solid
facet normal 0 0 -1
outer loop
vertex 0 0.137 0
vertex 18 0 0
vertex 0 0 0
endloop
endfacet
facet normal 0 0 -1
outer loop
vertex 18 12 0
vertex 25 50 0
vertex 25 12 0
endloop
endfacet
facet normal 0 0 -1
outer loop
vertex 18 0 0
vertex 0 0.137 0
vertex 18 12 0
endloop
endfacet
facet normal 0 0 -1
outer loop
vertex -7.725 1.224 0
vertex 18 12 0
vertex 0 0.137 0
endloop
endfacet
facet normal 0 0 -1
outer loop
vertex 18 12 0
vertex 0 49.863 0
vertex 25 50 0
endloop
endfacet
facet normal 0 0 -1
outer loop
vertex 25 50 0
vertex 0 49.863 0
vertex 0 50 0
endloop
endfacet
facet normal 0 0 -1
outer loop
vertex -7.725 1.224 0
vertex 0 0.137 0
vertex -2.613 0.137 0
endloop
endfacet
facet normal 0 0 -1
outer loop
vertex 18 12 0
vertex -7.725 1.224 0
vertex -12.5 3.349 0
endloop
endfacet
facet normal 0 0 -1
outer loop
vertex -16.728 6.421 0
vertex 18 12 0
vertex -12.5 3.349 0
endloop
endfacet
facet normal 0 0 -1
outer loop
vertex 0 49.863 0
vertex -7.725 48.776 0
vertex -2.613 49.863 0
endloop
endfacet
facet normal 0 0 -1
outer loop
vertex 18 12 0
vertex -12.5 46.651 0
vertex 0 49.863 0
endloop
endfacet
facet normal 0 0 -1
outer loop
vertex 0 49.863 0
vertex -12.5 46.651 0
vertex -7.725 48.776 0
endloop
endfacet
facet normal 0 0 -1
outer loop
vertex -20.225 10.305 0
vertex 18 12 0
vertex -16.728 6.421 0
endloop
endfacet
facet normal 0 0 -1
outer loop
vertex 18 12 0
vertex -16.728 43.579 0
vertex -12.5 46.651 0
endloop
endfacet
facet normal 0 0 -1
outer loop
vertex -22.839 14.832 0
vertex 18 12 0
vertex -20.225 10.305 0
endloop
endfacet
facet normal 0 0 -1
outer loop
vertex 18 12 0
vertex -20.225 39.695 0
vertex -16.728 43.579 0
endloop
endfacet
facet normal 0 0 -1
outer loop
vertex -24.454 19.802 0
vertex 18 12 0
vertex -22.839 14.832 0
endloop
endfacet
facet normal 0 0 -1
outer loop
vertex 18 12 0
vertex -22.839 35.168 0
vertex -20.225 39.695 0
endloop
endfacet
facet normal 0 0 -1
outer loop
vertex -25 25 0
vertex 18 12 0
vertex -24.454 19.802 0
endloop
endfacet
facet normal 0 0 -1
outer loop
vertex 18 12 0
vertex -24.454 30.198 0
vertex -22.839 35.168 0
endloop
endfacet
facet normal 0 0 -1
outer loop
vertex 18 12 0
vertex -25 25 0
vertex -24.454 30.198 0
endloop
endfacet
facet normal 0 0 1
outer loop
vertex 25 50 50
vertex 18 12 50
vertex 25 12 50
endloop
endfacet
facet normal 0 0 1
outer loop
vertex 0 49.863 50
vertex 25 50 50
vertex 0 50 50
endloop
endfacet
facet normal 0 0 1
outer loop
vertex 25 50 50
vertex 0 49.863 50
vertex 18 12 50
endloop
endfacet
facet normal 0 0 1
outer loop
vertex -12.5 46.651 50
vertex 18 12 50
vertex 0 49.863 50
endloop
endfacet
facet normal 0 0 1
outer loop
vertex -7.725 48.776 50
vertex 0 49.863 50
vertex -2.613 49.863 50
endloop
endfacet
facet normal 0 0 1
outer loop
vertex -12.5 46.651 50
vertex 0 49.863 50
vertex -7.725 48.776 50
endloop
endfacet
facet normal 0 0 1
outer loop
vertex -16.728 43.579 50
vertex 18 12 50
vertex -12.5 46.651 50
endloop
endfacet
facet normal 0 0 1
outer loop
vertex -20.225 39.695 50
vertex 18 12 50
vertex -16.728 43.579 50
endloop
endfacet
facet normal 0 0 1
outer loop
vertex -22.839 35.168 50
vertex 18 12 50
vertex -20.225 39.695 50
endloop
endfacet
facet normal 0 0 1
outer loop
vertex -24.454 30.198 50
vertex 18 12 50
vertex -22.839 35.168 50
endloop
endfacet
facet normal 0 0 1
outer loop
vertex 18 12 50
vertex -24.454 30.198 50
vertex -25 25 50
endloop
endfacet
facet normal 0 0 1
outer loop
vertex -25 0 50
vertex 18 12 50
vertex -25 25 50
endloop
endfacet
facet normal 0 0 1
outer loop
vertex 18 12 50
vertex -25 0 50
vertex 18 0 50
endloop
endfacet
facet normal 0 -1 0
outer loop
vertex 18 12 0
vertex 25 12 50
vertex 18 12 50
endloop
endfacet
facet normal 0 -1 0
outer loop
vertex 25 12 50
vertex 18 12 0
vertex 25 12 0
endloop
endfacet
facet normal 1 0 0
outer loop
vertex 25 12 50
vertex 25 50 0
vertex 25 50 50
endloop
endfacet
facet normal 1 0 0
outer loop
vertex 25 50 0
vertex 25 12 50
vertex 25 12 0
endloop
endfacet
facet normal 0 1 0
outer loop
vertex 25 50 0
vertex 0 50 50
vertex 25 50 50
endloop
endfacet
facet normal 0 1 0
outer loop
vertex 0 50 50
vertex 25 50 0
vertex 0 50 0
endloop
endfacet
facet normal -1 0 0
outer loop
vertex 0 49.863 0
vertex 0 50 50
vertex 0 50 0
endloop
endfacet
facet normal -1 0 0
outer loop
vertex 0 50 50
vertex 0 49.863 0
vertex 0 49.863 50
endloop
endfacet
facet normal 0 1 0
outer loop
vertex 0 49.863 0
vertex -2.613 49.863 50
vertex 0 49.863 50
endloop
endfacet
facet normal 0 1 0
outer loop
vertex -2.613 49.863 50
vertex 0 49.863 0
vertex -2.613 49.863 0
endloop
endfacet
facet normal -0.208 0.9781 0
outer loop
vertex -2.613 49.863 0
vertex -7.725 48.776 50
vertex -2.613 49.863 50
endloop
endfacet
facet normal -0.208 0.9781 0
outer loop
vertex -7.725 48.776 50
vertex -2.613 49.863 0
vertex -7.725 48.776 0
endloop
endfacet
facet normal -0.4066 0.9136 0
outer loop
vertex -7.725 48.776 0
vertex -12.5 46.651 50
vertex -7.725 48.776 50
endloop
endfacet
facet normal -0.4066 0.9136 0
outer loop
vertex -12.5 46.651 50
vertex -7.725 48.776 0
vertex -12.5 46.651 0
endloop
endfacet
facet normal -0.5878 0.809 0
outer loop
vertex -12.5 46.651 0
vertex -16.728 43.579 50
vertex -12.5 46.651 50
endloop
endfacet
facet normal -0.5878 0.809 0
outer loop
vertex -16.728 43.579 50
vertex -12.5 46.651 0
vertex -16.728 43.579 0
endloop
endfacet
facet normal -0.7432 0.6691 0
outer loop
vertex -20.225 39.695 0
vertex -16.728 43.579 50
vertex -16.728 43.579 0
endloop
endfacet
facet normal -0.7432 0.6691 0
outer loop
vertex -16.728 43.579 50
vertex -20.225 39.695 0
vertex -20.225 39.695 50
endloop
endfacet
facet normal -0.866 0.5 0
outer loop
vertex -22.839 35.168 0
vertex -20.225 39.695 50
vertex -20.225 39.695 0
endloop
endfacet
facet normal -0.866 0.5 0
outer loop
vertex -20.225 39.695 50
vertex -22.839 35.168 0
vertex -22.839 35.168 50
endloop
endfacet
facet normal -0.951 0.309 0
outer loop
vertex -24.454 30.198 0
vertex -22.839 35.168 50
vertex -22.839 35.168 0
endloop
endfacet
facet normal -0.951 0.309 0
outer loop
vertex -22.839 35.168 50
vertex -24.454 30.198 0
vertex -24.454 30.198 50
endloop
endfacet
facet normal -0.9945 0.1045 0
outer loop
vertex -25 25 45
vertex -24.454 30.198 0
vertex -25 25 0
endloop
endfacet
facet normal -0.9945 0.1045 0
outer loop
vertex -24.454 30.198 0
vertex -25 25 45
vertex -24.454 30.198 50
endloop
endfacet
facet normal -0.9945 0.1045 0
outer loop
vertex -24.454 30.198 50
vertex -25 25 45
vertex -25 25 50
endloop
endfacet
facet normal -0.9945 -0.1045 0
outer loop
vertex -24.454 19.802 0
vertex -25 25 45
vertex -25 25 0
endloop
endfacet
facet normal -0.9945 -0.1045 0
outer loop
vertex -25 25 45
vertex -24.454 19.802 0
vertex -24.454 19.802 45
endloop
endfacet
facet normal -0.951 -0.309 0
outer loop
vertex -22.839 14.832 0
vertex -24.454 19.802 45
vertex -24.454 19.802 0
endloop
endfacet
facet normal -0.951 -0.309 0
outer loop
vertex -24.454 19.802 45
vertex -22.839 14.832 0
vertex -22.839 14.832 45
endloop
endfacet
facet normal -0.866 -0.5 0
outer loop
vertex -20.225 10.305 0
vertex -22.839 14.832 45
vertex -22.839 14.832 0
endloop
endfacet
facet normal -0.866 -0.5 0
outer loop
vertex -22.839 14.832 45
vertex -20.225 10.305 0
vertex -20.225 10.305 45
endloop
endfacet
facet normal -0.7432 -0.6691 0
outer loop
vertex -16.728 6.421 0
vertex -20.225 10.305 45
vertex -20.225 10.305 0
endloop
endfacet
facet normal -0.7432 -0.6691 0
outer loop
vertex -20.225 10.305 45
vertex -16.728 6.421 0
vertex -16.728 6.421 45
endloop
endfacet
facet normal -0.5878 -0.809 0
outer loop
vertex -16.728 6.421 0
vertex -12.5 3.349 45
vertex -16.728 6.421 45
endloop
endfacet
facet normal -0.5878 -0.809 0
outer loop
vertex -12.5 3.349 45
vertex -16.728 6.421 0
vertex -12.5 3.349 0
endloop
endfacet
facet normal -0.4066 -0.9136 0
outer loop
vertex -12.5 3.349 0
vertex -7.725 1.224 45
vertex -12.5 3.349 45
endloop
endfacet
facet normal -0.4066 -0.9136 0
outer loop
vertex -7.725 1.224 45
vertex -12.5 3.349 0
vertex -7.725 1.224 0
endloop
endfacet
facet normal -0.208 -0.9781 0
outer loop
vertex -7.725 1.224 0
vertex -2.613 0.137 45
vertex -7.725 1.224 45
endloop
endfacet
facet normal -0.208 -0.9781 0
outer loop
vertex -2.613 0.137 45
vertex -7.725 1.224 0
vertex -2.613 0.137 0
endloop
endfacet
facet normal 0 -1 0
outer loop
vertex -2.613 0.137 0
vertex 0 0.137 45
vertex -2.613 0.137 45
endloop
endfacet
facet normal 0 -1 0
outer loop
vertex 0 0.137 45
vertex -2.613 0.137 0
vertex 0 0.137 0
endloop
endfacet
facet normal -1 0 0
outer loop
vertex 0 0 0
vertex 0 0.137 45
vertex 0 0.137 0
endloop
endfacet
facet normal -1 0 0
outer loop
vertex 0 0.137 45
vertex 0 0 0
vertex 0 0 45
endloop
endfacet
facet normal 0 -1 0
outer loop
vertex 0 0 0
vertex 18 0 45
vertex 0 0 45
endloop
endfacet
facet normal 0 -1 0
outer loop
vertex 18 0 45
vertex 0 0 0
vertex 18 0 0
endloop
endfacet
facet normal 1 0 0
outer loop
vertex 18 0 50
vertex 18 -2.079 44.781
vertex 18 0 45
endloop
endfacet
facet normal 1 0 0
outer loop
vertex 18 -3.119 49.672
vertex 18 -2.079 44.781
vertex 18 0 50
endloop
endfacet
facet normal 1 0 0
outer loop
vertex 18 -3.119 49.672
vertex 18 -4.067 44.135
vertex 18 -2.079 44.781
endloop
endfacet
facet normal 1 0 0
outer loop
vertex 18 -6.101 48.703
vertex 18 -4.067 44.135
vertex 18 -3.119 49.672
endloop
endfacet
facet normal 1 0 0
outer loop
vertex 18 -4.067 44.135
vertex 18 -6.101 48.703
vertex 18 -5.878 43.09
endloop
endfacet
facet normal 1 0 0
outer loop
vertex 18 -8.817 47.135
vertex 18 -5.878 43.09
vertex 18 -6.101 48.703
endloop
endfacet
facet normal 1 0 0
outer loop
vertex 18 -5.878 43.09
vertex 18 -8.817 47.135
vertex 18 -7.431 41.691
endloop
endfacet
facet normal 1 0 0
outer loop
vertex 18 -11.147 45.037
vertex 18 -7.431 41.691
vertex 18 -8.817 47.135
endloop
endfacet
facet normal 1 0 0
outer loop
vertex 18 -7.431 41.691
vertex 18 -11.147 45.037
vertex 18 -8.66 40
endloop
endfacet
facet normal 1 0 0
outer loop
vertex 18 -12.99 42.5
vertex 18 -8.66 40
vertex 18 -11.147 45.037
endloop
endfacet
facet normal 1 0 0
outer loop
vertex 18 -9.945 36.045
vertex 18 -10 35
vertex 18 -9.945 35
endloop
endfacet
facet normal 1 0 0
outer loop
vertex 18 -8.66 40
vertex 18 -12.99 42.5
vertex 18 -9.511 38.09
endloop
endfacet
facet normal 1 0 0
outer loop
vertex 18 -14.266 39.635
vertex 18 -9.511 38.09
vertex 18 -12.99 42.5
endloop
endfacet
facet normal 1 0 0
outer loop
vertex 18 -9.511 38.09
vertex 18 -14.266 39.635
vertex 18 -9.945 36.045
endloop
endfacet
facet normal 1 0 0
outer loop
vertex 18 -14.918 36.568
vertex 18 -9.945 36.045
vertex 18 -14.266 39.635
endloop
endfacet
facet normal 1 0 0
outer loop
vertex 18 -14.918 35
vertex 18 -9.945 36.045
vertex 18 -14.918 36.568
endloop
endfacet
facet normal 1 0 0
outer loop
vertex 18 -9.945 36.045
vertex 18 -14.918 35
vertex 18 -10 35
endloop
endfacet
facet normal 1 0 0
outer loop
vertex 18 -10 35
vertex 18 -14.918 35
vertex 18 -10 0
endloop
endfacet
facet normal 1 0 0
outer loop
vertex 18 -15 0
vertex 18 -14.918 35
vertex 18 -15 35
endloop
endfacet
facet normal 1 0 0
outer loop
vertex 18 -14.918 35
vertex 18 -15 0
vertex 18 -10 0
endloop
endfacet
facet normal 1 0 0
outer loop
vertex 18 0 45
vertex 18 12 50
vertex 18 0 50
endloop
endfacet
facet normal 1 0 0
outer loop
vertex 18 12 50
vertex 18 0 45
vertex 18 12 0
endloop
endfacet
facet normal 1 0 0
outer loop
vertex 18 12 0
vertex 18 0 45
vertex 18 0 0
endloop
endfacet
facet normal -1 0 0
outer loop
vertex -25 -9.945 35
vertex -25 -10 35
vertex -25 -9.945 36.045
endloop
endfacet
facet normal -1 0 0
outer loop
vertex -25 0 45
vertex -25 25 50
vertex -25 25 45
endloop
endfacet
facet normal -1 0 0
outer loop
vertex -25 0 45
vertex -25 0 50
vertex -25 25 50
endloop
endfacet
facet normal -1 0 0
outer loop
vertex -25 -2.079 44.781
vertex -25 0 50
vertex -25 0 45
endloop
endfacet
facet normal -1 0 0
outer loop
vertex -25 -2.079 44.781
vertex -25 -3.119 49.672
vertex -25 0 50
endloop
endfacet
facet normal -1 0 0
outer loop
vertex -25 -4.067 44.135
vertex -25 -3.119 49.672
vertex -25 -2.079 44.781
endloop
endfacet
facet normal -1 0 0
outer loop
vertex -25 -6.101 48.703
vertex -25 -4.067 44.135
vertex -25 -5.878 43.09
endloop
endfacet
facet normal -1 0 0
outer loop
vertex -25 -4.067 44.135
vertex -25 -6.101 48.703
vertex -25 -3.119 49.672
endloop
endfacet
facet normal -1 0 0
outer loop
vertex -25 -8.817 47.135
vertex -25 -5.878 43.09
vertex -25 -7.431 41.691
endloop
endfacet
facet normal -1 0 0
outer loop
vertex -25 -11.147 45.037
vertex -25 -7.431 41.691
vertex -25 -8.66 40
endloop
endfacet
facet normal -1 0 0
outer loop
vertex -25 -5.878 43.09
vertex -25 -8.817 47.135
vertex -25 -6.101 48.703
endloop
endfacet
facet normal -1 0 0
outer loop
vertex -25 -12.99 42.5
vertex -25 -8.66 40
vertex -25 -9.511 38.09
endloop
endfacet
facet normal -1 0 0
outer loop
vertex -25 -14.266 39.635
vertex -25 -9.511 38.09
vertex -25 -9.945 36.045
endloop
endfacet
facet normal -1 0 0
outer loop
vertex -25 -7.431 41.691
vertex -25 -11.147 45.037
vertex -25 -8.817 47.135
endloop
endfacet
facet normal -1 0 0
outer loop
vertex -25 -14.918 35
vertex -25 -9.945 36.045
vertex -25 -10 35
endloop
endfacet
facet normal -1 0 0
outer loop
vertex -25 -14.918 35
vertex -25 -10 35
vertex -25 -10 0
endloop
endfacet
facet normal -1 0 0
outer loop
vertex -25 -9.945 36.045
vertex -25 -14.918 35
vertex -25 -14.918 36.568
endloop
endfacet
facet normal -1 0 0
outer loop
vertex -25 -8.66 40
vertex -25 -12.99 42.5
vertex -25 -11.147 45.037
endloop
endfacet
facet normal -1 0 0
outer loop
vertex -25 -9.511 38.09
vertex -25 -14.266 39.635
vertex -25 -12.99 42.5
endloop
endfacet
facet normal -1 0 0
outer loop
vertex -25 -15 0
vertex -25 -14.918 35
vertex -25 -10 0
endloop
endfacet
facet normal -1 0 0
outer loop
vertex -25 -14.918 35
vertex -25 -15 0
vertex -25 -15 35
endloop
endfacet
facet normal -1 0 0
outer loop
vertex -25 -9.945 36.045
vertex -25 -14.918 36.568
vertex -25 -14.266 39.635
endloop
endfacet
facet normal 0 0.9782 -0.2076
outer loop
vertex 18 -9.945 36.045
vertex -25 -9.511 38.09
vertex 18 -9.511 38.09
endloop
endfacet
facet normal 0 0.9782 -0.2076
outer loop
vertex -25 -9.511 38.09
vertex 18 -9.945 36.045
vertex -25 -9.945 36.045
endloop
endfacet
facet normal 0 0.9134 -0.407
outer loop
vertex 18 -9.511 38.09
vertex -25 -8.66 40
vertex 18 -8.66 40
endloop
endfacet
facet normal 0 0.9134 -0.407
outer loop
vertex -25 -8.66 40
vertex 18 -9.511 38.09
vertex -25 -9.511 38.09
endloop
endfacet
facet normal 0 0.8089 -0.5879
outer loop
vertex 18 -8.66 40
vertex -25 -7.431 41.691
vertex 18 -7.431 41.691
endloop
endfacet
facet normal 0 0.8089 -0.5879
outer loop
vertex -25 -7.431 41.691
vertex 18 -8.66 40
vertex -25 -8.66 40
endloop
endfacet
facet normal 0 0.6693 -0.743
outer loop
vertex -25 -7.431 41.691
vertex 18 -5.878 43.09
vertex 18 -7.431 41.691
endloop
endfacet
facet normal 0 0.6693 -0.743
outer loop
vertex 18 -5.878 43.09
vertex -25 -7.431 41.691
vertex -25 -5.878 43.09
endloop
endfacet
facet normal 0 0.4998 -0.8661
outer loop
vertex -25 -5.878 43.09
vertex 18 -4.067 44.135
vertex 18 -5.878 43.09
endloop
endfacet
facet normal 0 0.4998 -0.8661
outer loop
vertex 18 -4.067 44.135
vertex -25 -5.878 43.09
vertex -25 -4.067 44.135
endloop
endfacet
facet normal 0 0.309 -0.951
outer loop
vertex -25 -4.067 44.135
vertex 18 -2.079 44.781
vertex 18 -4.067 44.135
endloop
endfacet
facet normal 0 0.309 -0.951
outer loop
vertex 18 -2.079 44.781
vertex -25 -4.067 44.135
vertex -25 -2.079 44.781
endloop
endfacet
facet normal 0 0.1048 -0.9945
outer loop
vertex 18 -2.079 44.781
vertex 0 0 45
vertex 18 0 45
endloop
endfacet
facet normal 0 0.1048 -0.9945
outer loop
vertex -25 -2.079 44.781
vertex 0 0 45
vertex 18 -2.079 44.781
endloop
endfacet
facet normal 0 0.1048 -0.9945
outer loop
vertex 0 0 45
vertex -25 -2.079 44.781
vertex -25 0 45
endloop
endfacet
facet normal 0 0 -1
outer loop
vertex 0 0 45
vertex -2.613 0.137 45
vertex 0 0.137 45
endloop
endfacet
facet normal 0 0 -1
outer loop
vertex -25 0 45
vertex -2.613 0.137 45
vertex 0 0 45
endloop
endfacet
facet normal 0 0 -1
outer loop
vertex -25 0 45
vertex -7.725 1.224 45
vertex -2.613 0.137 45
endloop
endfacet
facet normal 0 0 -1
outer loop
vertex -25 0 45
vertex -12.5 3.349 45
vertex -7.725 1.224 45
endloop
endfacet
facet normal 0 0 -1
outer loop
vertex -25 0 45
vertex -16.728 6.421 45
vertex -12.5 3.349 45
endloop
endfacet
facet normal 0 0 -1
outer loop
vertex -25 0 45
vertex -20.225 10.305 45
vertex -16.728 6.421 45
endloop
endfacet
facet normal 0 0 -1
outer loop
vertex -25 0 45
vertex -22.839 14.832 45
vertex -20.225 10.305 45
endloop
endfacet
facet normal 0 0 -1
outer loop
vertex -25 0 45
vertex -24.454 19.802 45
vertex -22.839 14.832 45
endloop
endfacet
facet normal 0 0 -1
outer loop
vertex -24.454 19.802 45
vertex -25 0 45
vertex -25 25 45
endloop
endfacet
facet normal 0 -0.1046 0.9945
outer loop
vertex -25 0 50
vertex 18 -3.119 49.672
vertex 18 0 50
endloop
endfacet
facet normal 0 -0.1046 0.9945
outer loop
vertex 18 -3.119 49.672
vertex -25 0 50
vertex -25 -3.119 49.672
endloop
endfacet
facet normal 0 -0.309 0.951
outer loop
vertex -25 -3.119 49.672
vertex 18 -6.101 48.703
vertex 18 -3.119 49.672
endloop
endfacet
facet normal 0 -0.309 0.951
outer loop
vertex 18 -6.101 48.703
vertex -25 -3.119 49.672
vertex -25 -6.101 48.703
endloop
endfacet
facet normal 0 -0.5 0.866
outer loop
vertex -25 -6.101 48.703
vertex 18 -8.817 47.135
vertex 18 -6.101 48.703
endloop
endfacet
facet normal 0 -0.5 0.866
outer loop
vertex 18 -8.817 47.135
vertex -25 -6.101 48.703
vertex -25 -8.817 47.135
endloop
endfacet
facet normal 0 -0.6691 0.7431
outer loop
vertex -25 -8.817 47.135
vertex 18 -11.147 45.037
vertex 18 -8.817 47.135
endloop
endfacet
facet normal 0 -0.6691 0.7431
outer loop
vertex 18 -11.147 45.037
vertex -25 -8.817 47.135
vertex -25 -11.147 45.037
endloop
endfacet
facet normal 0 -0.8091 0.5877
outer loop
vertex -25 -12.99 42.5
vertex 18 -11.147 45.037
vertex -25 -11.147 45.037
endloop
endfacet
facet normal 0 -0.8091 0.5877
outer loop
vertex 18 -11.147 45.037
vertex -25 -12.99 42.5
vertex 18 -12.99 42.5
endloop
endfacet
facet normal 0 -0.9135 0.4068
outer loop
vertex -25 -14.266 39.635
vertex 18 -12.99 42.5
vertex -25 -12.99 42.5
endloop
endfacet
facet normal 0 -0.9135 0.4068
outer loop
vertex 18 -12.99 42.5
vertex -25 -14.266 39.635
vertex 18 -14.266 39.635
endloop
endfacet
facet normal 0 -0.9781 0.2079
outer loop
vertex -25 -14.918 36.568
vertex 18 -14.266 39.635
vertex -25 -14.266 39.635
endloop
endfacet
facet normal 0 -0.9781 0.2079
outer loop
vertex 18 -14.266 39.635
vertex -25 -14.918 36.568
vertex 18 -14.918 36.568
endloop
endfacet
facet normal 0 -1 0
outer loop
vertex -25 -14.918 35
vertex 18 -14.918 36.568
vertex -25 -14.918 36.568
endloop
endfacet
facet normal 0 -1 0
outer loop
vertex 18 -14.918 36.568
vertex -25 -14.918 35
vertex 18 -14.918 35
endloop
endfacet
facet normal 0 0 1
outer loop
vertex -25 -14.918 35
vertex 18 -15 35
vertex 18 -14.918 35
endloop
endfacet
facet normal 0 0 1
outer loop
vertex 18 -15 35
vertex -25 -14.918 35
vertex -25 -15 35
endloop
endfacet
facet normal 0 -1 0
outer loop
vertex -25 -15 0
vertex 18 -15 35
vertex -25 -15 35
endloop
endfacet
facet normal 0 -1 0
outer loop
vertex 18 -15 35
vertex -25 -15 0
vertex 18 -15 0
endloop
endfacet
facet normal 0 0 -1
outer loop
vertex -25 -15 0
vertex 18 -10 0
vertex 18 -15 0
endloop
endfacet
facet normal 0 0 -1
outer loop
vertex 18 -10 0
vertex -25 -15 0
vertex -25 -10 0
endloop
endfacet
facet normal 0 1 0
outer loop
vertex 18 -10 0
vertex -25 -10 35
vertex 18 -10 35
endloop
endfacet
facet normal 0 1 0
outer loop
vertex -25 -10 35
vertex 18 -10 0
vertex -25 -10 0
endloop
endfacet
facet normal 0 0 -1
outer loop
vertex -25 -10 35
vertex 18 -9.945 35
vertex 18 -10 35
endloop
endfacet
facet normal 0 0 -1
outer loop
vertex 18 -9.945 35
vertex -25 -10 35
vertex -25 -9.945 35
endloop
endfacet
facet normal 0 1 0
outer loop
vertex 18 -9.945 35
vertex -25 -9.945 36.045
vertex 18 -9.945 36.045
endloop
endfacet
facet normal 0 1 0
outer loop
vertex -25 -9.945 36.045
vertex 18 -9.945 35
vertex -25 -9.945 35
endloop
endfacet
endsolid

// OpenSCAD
module corpo(){
linear_extrude(height = 50){

    difference(){

        union(){
            square([25,50]);
            translate([0,25,0]){
                circle(d=50);
            }
        }

        translate([18,0]){
            square([7,12]);
        }
    }
}
}
module pe(tp){
    linear_extrude(height = tp){
        union(){
        difference(){
            circle(r=15);
            circle(r=10);     
            translate([0,-50,0])square([100,100]);
            translate([-50,0,0])square([100,100]);
        }
        translate([0,-15,0])square([35,5]);
        translate([-15,0,0])square([5,25]);
        }
    }
}
tamanho_pe=50-7;
union(){
corpo();
translate([-tamanho_pe+18,0,35])rotate([0,90,0])pe(tamanho_pe);
}
